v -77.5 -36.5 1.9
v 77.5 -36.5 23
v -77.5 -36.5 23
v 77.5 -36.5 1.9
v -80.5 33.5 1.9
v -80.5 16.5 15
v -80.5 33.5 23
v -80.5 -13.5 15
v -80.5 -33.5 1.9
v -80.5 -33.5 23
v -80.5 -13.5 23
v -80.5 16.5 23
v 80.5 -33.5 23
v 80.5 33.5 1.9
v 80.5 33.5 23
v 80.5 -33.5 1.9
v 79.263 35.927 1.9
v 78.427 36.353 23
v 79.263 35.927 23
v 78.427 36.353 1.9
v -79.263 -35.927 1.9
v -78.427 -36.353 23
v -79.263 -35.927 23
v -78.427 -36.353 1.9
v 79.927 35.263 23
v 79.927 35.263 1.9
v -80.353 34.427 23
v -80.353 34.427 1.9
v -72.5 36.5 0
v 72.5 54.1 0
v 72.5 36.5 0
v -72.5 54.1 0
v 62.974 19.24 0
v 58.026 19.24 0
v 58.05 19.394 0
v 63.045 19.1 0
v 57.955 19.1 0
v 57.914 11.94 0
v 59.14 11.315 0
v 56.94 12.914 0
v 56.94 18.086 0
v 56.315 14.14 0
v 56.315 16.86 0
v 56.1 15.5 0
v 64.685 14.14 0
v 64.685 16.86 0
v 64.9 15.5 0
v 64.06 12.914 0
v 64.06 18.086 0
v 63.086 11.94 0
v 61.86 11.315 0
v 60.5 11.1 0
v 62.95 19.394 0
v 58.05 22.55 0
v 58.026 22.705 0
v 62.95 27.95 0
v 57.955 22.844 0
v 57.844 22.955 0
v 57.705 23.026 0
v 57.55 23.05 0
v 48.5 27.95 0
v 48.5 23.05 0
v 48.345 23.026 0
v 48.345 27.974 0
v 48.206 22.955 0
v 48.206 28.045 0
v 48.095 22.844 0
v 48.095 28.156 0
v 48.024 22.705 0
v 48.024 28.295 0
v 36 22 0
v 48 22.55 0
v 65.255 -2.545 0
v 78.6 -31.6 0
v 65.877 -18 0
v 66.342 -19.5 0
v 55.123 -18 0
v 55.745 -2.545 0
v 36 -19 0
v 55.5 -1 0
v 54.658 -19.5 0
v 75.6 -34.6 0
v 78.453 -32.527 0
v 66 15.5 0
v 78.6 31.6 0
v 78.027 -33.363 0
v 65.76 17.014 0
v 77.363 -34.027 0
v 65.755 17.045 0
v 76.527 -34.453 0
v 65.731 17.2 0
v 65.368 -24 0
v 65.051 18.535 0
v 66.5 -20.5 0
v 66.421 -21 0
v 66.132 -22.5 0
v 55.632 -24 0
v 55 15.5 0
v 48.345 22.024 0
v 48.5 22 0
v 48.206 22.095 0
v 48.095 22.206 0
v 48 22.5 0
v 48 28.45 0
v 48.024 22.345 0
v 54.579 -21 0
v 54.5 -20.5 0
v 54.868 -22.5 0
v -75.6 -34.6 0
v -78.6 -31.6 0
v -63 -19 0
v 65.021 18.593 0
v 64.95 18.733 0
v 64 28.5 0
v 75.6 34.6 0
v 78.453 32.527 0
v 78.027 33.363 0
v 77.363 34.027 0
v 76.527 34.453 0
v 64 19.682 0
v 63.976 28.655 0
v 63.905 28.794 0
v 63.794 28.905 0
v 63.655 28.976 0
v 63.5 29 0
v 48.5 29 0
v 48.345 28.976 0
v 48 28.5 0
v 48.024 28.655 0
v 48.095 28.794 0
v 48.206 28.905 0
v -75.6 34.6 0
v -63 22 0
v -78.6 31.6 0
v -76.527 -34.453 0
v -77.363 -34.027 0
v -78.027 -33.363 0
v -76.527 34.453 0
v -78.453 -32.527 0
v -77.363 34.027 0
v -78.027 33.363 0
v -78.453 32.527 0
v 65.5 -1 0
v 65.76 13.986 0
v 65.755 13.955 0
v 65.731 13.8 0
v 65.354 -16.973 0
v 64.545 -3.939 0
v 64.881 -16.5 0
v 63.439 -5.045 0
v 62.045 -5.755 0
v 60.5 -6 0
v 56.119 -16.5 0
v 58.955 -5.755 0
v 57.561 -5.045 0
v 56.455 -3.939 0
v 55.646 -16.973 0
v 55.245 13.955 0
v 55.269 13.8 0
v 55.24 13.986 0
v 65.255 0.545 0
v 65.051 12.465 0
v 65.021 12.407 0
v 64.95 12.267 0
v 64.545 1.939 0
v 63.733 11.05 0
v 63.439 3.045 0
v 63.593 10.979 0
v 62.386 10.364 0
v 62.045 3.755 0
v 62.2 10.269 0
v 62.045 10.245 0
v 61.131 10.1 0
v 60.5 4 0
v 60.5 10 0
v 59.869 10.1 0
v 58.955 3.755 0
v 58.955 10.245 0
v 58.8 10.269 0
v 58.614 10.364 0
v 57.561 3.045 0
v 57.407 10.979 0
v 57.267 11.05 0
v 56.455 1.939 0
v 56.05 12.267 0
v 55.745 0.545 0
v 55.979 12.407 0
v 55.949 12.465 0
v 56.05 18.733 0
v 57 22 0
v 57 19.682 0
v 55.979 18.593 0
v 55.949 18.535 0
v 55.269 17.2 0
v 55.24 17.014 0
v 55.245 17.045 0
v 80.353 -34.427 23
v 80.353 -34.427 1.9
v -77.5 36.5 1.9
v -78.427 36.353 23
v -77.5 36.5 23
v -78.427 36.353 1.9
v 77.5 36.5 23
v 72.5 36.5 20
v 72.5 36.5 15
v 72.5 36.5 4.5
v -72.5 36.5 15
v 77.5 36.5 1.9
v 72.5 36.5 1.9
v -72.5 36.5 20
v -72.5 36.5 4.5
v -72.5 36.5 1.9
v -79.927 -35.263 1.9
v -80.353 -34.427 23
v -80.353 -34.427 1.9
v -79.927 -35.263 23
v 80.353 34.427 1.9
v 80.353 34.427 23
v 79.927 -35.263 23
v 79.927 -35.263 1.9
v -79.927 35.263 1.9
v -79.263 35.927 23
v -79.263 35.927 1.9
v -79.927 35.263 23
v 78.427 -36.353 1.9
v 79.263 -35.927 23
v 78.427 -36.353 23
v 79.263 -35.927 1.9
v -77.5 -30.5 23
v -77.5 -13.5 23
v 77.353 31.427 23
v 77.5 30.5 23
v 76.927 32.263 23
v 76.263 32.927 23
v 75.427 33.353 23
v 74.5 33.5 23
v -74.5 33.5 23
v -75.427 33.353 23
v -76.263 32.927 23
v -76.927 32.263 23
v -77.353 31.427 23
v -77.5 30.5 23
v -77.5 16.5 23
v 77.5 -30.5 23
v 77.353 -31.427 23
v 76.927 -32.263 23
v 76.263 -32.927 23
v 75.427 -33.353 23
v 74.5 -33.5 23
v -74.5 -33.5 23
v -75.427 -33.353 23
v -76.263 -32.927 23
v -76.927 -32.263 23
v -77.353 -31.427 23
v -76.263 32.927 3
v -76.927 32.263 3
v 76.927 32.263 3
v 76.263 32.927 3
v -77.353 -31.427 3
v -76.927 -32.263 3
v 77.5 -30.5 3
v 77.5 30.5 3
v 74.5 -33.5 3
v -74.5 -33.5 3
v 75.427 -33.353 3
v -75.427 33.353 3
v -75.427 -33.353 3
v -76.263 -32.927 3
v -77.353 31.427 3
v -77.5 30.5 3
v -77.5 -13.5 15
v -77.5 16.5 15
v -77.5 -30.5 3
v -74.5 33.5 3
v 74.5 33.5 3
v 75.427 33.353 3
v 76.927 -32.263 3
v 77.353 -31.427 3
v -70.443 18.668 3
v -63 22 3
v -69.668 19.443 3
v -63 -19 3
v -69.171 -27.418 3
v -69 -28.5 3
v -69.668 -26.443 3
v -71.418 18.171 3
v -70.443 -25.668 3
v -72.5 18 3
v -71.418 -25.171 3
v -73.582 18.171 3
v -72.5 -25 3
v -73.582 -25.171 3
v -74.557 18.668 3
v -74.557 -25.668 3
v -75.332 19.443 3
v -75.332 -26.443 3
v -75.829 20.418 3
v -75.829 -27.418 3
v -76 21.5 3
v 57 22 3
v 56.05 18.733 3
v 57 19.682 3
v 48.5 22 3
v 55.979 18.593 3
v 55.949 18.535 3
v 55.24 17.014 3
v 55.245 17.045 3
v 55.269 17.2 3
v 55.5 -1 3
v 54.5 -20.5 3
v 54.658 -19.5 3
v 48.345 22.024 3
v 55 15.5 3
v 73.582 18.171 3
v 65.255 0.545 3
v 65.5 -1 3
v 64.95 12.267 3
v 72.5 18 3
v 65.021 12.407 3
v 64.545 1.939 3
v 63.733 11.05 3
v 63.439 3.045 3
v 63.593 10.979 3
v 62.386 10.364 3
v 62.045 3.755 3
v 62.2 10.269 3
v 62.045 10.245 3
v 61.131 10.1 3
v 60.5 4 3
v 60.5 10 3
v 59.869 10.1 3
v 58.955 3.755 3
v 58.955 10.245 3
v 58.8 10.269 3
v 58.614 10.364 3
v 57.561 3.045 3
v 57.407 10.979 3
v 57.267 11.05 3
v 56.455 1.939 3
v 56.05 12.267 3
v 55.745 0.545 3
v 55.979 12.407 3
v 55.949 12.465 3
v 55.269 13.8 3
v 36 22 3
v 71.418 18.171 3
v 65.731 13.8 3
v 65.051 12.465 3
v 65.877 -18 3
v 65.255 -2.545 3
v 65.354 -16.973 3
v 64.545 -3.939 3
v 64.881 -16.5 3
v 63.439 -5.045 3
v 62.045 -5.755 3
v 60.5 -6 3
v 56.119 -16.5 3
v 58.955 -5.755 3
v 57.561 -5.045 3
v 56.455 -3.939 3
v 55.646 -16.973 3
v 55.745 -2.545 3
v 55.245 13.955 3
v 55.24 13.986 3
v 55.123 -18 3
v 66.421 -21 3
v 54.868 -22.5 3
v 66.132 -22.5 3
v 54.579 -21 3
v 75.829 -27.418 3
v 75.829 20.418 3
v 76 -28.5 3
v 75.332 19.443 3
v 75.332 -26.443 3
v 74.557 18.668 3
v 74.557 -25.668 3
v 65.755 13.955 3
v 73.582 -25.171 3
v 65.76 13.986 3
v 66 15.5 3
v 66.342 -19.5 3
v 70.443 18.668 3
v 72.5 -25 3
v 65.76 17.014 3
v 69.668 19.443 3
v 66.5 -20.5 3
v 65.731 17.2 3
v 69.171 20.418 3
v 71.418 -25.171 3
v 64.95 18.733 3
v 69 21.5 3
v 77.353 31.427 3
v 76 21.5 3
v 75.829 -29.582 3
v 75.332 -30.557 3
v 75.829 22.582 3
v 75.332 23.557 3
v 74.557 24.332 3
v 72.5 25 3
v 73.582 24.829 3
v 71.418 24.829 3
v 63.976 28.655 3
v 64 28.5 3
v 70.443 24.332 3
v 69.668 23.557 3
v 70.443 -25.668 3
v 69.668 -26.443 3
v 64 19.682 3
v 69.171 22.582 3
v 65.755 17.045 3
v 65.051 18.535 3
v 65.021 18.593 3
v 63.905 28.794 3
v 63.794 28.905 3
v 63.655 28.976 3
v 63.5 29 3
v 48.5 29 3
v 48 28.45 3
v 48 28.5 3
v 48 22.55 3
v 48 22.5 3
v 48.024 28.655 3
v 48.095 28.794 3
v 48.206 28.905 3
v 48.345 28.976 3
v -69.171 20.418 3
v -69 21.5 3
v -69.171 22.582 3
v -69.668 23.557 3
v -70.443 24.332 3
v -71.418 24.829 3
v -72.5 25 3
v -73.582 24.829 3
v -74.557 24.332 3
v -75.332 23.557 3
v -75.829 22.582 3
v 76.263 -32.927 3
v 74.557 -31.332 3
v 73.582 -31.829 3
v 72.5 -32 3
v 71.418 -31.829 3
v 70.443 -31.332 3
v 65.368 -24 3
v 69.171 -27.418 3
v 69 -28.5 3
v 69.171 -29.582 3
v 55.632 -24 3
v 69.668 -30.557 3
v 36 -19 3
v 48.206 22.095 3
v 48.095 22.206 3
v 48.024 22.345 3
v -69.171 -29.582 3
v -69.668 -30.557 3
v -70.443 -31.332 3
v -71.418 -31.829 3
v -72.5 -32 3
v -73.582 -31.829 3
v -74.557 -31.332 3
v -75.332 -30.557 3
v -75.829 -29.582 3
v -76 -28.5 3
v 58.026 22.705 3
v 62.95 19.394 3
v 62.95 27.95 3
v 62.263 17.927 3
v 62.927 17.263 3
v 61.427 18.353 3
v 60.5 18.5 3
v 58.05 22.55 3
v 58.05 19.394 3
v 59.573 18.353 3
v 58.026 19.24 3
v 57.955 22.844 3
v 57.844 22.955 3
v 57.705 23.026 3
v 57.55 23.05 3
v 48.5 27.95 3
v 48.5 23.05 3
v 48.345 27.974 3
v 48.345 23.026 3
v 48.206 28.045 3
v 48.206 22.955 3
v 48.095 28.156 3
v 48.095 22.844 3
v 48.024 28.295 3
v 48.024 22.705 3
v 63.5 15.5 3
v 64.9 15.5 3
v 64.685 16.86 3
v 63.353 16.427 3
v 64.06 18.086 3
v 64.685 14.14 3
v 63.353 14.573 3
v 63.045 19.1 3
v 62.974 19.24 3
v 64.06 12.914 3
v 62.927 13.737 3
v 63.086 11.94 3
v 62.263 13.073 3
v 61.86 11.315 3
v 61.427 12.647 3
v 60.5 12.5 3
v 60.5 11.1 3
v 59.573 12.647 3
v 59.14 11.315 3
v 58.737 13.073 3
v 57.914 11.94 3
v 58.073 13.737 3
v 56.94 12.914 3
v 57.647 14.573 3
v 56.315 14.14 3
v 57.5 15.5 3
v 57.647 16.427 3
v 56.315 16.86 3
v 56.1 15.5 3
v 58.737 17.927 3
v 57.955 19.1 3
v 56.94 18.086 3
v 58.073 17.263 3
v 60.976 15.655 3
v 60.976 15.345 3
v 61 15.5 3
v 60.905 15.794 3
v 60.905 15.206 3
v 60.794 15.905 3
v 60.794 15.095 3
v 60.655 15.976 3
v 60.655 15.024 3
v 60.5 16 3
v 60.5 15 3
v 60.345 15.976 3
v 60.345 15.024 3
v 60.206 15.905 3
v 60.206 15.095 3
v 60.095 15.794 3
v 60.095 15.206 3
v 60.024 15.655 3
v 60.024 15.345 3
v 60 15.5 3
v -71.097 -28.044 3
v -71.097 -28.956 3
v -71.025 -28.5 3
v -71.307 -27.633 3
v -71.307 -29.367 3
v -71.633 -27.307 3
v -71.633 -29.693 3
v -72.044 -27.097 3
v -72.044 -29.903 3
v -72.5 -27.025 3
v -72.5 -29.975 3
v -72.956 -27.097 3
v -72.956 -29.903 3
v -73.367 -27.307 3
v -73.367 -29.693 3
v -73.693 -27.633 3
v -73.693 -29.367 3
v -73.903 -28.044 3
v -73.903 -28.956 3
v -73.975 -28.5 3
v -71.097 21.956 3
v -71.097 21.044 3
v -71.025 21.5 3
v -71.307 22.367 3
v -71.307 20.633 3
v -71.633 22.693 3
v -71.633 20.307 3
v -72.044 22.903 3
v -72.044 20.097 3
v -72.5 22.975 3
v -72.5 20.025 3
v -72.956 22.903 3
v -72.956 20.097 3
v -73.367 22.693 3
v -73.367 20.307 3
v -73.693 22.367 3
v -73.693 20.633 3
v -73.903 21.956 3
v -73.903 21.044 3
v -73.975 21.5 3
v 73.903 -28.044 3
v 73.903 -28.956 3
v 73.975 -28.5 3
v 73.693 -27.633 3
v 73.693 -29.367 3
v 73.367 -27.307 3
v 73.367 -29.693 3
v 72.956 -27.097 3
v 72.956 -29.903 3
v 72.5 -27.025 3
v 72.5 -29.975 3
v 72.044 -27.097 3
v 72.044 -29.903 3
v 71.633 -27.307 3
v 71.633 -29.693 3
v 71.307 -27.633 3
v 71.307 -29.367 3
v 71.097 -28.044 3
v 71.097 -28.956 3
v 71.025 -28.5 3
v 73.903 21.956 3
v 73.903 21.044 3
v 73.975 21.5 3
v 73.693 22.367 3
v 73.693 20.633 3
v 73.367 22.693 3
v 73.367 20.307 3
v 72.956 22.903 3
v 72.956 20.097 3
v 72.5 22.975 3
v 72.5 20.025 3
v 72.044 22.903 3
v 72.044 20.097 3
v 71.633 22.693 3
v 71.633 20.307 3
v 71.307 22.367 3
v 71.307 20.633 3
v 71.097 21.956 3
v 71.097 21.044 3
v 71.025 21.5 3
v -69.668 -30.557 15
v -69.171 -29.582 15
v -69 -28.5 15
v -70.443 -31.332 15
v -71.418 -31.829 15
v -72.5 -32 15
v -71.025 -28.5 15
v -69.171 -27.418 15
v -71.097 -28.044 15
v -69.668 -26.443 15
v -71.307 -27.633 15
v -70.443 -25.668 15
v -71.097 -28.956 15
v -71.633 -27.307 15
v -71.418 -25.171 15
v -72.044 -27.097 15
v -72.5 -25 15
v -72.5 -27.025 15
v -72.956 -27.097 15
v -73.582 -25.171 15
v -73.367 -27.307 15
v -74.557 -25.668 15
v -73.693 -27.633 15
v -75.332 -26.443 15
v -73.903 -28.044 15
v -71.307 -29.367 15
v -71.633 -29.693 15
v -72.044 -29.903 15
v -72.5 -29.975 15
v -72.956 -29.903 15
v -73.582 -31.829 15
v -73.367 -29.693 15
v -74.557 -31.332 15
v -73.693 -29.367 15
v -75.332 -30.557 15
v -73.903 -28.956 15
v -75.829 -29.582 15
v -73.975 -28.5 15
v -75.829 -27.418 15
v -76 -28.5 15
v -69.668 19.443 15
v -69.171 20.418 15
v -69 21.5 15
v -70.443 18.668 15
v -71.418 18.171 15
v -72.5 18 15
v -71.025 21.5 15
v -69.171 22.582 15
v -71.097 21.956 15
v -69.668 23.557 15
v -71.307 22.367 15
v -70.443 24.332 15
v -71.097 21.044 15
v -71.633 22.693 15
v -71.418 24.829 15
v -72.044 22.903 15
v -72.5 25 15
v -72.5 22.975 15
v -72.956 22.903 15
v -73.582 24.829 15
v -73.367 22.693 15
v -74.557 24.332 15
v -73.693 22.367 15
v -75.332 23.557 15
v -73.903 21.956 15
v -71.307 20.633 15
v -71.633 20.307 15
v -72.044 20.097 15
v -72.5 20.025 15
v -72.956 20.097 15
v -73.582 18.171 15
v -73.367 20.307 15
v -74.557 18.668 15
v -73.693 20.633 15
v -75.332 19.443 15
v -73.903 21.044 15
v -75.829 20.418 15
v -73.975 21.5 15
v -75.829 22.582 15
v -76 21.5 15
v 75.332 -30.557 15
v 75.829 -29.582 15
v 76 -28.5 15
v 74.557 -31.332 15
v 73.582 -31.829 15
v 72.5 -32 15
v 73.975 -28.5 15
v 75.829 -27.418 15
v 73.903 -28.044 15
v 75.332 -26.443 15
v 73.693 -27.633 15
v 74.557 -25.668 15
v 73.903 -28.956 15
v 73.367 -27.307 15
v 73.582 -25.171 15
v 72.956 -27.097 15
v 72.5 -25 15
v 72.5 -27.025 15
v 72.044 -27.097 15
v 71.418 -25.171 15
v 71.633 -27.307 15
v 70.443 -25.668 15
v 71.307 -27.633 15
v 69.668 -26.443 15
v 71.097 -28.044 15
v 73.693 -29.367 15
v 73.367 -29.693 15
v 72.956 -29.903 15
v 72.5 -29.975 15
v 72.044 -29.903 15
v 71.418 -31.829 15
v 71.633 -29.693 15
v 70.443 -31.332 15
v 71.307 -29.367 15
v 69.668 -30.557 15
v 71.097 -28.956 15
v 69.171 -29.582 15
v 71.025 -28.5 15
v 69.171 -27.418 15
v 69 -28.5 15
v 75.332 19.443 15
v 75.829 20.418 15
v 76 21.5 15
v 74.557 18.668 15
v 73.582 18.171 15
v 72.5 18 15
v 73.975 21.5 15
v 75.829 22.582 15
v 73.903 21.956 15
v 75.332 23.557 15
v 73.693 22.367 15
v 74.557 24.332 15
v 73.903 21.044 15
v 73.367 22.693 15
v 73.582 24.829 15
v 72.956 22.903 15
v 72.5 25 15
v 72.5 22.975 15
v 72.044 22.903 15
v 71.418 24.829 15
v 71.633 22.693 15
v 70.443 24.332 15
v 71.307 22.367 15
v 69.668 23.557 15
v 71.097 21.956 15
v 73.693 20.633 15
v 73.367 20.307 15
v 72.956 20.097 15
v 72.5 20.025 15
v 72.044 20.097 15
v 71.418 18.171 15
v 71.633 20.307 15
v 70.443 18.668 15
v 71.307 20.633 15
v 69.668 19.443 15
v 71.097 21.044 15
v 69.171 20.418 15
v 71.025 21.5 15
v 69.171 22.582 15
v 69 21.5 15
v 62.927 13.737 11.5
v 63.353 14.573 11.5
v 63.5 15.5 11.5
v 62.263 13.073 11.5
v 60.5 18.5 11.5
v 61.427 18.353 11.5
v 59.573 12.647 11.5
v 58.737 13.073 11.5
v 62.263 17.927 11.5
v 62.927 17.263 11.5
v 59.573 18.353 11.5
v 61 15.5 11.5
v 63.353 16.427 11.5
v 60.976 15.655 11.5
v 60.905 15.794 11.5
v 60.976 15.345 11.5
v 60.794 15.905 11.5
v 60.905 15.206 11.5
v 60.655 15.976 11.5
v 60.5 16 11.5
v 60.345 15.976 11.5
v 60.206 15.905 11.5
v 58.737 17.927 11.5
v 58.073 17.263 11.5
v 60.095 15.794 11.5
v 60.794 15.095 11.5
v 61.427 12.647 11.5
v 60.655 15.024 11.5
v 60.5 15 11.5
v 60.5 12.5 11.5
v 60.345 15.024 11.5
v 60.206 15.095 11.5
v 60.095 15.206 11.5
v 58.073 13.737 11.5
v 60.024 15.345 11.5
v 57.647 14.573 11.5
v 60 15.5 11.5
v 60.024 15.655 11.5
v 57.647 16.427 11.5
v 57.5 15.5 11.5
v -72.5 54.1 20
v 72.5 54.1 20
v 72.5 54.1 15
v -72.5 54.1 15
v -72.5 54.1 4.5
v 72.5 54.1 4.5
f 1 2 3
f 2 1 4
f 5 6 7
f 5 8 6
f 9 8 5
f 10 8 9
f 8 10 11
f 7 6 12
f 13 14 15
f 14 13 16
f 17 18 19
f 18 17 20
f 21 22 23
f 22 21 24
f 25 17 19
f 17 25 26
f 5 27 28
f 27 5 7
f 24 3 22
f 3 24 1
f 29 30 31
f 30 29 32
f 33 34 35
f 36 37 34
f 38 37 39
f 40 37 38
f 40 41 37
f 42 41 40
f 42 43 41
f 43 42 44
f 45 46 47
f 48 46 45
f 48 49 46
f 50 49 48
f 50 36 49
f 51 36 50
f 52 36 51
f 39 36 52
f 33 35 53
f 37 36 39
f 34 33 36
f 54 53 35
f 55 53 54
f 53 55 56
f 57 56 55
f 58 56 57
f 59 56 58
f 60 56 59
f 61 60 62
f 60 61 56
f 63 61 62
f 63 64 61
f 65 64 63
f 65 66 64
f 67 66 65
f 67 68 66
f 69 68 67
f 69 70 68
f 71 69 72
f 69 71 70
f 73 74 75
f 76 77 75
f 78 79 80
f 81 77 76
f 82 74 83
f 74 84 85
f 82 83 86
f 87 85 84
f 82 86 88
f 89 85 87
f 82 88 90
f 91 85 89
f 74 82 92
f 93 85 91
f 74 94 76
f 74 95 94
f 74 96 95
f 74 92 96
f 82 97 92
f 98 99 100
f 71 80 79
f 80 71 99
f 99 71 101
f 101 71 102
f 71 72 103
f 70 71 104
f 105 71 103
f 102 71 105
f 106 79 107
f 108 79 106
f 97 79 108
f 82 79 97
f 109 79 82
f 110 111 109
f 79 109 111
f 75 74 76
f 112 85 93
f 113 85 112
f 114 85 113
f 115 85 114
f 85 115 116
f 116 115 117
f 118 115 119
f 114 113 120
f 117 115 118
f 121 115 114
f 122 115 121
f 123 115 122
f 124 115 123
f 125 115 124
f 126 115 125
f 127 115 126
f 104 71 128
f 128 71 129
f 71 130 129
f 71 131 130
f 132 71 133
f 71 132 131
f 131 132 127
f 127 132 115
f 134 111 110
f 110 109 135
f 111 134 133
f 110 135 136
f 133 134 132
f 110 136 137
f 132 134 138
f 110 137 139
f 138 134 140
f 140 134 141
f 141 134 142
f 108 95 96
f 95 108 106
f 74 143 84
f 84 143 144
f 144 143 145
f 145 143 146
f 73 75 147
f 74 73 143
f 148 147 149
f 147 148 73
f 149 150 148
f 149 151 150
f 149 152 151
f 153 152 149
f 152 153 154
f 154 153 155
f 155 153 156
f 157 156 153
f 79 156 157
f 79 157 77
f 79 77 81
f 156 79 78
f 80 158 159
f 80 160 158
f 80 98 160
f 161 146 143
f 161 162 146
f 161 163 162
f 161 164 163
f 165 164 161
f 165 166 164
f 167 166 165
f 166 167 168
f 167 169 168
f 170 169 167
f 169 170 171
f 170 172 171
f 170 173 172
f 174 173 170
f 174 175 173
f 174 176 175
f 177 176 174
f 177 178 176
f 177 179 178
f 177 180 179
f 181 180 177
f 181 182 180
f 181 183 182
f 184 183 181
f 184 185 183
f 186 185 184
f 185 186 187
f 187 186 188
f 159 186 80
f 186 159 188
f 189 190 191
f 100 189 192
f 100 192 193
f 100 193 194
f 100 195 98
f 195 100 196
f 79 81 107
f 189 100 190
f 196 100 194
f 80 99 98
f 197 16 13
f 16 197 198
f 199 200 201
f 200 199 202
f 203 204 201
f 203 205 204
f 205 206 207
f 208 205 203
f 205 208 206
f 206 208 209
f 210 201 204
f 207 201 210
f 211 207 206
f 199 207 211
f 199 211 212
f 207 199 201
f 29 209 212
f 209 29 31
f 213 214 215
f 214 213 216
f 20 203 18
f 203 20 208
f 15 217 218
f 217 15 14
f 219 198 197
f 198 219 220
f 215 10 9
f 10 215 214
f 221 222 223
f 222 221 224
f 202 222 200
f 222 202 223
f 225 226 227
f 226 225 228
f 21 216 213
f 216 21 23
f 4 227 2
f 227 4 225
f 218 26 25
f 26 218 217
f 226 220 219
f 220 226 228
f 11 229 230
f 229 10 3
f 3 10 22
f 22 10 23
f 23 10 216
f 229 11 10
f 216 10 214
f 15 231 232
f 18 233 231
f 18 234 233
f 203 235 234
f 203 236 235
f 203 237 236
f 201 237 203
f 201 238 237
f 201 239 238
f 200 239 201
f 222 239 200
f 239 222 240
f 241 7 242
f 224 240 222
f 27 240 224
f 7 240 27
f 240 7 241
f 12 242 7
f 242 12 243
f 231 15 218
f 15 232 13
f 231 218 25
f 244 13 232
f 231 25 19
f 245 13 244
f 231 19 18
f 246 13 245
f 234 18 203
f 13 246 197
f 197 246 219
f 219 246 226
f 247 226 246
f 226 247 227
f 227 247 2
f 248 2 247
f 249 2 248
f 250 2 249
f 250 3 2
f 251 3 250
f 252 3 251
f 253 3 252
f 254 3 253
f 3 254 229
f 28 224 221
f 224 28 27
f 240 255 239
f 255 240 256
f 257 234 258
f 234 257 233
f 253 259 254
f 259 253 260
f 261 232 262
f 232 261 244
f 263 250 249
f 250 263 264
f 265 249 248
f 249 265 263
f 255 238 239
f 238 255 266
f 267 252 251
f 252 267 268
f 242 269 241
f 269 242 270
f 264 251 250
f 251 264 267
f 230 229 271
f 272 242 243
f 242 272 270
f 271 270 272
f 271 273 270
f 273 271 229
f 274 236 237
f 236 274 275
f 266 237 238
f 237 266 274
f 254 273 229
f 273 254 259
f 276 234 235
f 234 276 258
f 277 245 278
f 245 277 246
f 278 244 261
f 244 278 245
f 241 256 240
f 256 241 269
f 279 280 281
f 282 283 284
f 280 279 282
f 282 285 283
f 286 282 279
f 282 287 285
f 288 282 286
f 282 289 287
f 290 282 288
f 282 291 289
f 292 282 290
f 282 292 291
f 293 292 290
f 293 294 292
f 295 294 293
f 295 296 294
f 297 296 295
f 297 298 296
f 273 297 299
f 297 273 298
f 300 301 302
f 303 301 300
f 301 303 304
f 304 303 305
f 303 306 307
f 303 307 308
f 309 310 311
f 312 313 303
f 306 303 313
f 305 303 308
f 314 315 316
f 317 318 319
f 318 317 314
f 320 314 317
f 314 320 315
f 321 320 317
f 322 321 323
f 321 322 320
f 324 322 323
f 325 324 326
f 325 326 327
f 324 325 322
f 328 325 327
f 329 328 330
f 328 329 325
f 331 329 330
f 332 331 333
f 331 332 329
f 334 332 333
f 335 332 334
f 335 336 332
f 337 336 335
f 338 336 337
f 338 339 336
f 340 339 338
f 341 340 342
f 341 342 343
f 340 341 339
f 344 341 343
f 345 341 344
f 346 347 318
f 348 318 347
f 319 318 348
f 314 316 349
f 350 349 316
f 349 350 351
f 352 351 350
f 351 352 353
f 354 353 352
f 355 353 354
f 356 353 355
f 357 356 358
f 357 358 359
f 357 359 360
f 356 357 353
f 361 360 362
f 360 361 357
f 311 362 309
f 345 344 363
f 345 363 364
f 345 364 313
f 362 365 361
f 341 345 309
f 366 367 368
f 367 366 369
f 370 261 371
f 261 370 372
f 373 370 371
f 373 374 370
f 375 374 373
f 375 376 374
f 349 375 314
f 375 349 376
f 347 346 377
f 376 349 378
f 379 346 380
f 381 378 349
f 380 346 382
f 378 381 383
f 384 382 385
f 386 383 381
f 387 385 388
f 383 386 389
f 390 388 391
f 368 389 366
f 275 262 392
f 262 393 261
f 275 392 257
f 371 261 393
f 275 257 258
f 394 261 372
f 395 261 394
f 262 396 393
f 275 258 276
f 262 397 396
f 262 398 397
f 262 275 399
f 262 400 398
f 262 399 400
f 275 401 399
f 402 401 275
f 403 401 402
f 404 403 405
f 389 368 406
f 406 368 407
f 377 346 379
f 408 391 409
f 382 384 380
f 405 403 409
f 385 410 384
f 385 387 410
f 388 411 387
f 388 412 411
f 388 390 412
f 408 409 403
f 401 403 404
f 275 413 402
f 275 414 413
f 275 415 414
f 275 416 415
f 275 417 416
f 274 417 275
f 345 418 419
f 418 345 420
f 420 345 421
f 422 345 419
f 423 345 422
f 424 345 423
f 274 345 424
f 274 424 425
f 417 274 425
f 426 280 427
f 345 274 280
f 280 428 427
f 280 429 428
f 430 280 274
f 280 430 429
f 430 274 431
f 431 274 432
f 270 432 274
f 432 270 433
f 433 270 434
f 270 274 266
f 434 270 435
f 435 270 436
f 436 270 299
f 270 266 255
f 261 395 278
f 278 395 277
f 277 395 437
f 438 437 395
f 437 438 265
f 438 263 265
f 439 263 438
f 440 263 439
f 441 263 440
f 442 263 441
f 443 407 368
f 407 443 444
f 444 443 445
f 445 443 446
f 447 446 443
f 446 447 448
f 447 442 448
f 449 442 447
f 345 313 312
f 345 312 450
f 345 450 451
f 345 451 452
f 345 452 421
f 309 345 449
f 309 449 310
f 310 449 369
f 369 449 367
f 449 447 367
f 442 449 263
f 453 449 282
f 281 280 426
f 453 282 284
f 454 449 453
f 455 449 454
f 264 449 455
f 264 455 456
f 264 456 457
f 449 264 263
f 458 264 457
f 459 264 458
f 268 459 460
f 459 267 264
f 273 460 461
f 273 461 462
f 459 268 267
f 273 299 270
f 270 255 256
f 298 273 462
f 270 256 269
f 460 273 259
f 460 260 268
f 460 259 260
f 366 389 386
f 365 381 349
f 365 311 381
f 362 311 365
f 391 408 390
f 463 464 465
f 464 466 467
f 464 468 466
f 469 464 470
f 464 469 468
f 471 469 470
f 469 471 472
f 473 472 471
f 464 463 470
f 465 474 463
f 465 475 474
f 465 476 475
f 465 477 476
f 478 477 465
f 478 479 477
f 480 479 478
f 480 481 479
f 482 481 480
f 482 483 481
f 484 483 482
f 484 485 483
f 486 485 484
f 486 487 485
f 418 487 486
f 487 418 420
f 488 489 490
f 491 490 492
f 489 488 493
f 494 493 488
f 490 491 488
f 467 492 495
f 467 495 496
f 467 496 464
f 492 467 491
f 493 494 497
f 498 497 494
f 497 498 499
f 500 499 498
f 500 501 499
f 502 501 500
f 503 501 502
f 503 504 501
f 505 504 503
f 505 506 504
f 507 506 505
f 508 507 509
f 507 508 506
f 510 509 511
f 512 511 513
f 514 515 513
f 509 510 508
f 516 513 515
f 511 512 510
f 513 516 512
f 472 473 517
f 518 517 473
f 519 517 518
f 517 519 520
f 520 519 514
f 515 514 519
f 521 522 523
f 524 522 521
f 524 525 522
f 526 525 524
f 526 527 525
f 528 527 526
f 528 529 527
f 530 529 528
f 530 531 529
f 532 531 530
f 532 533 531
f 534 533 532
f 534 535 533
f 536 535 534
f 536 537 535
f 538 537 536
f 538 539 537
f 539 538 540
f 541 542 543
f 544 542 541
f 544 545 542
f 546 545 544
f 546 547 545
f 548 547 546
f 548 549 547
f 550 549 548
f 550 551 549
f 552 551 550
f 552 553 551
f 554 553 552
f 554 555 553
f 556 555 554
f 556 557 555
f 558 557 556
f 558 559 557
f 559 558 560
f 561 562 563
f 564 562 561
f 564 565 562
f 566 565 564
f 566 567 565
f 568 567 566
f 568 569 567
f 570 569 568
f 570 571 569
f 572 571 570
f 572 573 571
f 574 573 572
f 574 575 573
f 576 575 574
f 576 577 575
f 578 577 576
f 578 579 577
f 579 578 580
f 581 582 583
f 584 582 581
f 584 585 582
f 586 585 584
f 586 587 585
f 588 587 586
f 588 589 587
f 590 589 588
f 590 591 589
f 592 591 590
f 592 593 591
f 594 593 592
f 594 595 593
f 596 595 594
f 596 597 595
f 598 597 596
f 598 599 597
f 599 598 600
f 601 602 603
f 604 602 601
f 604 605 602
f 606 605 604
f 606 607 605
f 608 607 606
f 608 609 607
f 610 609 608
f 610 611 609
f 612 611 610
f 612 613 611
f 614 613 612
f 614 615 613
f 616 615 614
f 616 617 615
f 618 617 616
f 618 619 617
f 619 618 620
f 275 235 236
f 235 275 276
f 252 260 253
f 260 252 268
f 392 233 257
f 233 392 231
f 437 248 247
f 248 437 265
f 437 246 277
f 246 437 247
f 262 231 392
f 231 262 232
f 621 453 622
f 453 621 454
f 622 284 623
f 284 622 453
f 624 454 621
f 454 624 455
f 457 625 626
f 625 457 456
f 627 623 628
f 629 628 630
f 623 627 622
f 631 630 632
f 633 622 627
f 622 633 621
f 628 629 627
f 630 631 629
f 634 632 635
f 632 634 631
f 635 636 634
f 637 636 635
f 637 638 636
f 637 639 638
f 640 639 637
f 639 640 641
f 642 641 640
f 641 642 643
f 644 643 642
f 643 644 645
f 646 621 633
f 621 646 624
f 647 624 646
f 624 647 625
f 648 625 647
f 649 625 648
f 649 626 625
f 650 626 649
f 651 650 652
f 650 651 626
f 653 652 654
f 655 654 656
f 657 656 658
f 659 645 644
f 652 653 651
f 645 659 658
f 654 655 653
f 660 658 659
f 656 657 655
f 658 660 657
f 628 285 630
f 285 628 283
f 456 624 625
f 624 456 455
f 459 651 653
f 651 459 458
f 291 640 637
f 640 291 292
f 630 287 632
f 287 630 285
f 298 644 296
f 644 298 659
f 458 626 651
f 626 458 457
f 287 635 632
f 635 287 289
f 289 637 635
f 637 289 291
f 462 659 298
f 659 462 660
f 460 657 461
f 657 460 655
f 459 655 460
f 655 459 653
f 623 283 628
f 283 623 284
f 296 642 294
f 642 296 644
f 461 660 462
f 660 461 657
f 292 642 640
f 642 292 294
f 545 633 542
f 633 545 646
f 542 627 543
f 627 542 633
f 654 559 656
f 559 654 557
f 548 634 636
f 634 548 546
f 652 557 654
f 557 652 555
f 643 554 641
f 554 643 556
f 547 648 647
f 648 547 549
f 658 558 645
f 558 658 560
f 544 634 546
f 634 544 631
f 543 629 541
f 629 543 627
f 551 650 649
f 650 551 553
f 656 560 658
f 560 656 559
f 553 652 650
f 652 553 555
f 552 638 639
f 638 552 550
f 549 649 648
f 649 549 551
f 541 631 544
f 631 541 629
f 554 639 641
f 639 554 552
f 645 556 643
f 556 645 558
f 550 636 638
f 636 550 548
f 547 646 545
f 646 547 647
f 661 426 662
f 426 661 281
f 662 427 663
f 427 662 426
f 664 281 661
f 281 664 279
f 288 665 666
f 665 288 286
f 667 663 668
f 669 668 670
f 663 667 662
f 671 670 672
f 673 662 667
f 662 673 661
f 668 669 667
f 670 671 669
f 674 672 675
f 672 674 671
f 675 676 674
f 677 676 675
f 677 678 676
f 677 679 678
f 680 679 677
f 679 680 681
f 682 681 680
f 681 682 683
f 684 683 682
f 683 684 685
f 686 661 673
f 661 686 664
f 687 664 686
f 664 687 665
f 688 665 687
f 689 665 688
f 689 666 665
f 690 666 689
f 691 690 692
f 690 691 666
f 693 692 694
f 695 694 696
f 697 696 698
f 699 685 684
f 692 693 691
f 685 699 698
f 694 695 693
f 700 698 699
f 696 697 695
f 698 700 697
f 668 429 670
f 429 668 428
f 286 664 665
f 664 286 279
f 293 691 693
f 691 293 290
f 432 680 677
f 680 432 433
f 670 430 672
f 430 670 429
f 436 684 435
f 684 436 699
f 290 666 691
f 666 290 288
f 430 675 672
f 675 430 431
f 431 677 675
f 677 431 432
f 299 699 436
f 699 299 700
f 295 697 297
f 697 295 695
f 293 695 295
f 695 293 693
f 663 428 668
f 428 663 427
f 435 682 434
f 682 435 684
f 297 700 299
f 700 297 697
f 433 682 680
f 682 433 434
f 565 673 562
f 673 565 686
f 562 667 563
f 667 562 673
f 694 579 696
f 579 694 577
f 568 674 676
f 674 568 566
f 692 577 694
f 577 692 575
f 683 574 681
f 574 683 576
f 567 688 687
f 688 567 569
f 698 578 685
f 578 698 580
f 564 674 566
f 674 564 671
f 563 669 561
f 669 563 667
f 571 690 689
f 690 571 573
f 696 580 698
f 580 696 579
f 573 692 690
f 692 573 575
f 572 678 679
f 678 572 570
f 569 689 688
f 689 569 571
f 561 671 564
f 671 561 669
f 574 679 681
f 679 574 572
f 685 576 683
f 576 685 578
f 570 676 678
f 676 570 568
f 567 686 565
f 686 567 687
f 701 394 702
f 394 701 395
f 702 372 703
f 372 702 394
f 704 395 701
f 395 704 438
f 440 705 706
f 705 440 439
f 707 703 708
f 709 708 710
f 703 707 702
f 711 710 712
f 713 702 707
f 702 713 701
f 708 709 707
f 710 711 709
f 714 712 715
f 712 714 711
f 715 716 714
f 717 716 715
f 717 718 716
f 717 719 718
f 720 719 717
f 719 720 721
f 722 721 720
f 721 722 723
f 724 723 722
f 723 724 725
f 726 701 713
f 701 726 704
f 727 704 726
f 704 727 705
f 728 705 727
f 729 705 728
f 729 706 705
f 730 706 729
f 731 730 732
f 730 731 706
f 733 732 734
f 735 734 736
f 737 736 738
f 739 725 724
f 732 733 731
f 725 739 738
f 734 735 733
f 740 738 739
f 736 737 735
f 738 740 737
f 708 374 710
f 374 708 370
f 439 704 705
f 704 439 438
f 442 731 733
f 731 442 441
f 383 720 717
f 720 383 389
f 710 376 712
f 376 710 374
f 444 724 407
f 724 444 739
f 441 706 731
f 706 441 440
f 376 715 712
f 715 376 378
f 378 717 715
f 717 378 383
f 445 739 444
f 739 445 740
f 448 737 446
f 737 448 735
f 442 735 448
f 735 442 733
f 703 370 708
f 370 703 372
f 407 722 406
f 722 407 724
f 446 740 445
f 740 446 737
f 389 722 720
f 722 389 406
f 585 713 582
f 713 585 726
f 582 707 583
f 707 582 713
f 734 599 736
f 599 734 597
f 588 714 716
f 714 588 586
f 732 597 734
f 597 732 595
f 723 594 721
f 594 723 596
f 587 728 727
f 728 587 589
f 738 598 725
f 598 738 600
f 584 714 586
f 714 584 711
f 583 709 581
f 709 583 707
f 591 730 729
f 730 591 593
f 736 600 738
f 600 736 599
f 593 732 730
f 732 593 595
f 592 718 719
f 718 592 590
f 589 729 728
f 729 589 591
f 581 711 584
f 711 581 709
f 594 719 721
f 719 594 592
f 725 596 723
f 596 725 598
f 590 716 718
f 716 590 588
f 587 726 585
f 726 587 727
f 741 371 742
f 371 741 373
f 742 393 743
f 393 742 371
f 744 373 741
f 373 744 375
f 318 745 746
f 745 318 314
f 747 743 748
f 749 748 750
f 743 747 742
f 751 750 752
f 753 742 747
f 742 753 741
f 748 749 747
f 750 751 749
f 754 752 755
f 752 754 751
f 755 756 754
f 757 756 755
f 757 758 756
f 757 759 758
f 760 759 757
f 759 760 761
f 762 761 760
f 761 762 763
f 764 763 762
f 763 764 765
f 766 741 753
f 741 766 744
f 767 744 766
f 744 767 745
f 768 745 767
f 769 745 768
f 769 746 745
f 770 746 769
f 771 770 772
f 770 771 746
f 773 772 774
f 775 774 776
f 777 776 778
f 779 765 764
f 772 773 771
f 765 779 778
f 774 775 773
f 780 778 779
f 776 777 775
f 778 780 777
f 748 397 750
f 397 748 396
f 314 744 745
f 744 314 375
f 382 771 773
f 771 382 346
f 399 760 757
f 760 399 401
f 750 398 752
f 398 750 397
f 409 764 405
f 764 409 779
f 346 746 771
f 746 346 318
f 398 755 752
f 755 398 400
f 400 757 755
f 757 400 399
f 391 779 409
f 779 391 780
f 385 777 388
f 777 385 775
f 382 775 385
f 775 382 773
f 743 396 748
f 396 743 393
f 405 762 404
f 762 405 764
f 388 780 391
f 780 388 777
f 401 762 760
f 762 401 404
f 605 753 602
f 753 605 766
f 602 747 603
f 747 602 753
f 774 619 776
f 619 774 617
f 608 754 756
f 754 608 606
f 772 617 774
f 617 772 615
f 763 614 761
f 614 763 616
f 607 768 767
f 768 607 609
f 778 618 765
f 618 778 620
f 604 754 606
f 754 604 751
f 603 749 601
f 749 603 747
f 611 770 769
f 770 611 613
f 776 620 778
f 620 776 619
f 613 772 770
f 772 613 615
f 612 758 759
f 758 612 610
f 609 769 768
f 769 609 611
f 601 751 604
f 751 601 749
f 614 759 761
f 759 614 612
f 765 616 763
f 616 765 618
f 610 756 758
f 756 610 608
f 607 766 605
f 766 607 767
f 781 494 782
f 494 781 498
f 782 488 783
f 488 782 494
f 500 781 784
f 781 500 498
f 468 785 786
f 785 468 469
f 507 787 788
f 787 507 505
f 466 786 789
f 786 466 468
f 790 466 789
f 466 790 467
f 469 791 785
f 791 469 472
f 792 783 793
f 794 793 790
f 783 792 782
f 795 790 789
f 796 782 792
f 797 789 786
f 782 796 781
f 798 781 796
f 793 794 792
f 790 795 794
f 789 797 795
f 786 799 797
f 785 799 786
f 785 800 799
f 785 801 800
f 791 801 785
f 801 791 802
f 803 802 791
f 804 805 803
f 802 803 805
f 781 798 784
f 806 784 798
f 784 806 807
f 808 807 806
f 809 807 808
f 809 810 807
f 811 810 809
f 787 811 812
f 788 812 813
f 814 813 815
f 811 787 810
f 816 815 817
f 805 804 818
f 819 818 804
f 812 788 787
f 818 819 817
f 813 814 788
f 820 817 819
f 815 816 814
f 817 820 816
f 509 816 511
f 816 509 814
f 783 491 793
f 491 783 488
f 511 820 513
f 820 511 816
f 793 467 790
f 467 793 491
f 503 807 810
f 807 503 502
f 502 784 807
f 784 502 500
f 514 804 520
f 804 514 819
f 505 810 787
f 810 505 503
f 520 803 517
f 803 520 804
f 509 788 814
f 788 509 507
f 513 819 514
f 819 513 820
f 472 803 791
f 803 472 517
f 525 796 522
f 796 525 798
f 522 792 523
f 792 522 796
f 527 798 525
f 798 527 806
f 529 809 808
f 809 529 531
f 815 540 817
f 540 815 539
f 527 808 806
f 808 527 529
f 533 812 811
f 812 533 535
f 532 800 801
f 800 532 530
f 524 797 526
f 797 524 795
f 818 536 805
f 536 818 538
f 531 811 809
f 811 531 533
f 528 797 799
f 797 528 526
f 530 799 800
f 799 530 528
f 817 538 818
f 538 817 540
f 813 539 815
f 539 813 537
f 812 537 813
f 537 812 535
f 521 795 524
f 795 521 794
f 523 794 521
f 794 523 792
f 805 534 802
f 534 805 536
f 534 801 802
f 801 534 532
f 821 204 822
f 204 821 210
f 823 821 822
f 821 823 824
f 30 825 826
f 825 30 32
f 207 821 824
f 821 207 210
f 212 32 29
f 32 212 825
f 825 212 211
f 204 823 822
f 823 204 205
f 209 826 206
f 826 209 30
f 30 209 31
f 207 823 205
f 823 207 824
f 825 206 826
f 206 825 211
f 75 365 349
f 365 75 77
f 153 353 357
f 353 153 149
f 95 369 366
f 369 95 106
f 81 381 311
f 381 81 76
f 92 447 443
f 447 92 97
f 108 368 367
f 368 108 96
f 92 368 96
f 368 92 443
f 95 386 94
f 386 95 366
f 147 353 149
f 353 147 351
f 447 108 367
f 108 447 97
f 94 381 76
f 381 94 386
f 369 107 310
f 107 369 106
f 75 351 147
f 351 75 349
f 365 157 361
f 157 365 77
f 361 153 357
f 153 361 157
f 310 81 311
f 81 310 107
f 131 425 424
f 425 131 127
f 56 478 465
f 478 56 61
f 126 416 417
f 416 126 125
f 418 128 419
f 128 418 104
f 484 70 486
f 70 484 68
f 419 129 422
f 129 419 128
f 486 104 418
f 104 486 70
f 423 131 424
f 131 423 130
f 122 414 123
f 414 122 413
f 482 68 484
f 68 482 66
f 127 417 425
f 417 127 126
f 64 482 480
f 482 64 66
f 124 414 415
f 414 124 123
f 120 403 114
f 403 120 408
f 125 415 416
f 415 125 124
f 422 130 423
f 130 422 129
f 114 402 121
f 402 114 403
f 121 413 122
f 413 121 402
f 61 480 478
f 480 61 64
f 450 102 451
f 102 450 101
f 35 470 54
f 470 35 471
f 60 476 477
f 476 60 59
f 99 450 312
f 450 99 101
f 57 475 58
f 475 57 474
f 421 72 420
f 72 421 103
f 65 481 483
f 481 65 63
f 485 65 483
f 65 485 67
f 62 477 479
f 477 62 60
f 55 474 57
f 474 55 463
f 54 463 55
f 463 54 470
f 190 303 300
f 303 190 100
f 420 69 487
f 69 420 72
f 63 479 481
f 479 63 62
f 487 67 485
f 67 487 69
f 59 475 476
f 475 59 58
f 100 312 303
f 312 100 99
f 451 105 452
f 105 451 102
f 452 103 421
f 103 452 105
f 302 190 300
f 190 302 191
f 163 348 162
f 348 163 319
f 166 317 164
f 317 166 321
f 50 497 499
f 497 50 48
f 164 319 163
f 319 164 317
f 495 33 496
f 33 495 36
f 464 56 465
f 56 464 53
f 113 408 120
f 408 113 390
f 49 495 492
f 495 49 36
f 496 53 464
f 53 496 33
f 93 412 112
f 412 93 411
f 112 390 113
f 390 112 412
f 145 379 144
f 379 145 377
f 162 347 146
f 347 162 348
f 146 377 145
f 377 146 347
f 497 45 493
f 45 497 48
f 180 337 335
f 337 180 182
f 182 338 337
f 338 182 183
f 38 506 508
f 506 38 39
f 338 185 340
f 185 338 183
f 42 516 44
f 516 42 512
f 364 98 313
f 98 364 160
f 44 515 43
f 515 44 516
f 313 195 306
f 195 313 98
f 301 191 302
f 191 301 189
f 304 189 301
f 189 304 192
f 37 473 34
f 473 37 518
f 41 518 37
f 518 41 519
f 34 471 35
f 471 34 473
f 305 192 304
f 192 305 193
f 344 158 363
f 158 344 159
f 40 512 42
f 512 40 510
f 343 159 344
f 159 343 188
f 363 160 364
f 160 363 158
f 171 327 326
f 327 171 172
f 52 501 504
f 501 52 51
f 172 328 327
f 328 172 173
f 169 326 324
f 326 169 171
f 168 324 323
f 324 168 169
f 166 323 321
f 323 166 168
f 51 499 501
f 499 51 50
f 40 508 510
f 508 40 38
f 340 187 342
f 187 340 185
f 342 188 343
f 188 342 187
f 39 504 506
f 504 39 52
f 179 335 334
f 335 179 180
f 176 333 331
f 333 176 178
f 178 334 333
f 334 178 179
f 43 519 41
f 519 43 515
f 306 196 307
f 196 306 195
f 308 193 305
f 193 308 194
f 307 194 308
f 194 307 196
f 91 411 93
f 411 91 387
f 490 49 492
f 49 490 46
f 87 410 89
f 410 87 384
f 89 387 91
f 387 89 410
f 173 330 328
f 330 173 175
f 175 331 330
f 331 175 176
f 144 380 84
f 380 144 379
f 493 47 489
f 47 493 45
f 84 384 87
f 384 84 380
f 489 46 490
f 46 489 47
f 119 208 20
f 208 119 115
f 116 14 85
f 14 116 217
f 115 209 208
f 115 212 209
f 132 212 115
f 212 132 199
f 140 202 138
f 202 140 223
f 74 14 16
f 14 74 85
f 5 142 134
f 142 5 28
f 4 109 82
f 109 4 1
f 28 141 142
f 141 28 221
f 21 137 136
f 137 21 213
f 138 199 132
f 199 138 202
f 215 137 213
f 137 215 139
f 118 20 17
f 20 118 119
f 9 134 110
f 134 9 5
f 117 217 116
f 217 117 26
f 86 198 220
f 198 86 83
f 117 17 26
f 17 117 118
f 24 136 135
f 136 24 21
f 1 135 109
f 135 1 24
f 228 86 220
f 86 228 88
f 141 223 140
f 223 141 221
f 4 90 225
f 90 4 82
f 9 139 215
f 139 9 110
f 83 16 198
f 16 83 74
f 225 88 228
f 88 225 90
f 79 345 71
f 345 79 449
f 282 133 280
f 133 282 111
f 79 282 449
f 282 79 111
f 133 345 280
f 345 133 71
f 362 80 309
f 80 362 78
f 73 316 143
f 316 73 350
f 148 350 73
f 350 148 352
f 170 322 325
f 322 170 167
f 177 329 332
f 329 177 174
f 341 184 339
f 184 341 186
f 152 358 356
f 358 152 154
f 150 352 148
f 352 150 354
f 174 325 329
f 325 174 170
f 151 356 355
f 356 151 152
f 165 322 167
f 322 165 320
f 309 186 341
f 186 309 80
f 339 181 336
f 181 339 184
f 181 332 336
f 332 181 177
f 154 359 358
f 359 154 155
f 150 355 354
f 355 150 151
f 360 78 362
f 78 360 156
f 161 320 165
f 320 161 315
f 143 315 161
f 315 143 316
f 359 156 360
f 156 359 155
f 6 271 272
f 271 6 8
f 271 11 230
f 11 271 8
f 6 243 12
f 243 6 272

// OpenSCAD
// yet another LCD panel case.  This one is for the GEEETech, which I think is pretty much the same as the RepRapDiscount one.
// this is intended to be used with a complementary rear mount of some kind.
//
// John Ridley October 24 2013 
// 	Prusa i3 single plate versión modified by Pablo Blanco 2014


prusai3_frame_width = 10.5;

boxix = 155; 
boxiy = 67;
boxiz = 20;

dispx = 99;
dispy = 41;
dispxoff = 14.5;
dispyoff = 14.5;
disptaper = 2; // 2mm taper on each side

controld = 10;
controlxoff = 138;
controlyoff = 32.5;
buzzyoff = 13;

buttond = 10;
buttonxoff = 138;
buttonyoff = 49;
buttonht = 8.5;

mountx = 145;
mounty = 50;
mountxoff = 5; 
mountyoff = 5;
mountpillard = 7;
mountholed = 2.95;
mountht = 12;

// the mounting bracket stuff
screwheadd = 9;
screwholed = 4.2;
woodscrewd = 4.2;
woodscrewh = 7;
woodscrewhh = 2;
hingelength = 50;
mountmainlength = 35;
mounthingelength = 15;
// put the mount near the controls for stability
// that's where people will be poking at the thing.
mountoffset = 40;

sdy = 30;
sdz = boxiz - mountht;
sdyoff = 20;
sdht = 4;

cornerr = 3;
wall = 3;

// knob dimensions
ctlid = 6.3;
ctldd = 5; // dimension across d flat
ctlod = 9;
ctlht = 5;
knobd = 25;
knobh = 15;


$fn = 20;




// this is the panel cover
if (1)
{
	// flip over for printing
	translate([0,0,boxiz+wall])
	rotate([180,0,0])

	difference()
	{
		boxsolids();
		boxvoids();
	}
}

// this is the mounting hinge - make two, use a 6-32 x 3" screw
if (0)
{
	rotate([90,0,0])
	difference()
	{
		union()
		{
			frame_support(mounthingelength);
			cube([mounthingelength, wall, hingelength]);
		}
		for (z=[0,1])
		translate([mounthingelength/2,wall+0.01,screwheadd*2 + z*(hingelength-screwheadd*3)])
		rotate([90,0,0])
		woodscrewhole(woodscrewd, woodscrewh, woodscrewhh, wall+0.1);
	}
}

// this is the knob
if (0)
{
	difference()
	{
		knobsolids();
		knobvoids();
	}
}

ctlid = 6.3;
ctldd = 5; // dimension across d flat
ctlod = 12;
ctlht = 5;
knobd = 25;
knobh = 10;
knobtaper = 2;

module knobsolids()
{
	hull()
	{
		cylinder(r=(knobd-knobtaper*2)/2, h=0.01);
		translate([0,0,knobtaper])
			cylinder(r=knobd/2, h=knobh-knobtaper);
	}
}

module knobvoids()
{
	// hollow out most of the interior
	translate([0,0,6])
	{
	difference()
	{
		cylinder(r=knobd/2-4, h=knobh);
		cylinder(r=ctlod/2, h=knobh);
	}

	// shaft hole
//	translate([0,0,5])
	difference()
	{
		cylinder(r=ctlid/2, h=knobh);
		// this is one way to make the key
		translate([0, (ctlid-ctldd+1.5),0])
			cylinder(r=1.5, h=knobh);
		// this is another = 
//		translate([-ctlid/2,ctlid-ctldd,0])
//			cube([ctlid, ctlid, knobh]);
	}
	// cutouts for flat springy bit
	// only use if needed - it weakens the part
//	for (x1=[-1,1])
//	translate([-0.5 + x1*2.5,ctlid-ctldd,0])
//		cube([1,5,knobh]);
	}

	// some knurling
	for (a=[0:9])
	rotate([0,0,a*360/10])
	translate([3+knobd/2,0,0])
	cylinder(r=4,h=knobh);
}

module woodscrewhole(screwd, headd, headh, wallthick)
{
	cylinder(r=screwd/2, h=wallthick);
	cylinder(r1=headd/2, r2=screwd/2, h=headh);
}


module boxvoids()
{

	if (0) // actually don't bevel since we're inset
	{
		// let's bevel the display edges
	// display cutout
	translate([-boxix/2 + dispxoff, -dispy+boxiy/2-dispyoff, boxiz])
		union()
		{
			hull()
			{
				translate([-disptaper, -disptaper, wall])
					cube([dispx+disptaper*2, dispy+disptaper*2, 0.1]);
				translate([0,0,wall*1/3])
					cube([dispx, dispy, 0.1]);
			}
			cube([dispx, dispy, wall]);
		}
	}
	if (1) // untapered display cutout
	{
	// display cutout
	translate([-boxix/2 + dispxoff, -dispy+boxiy/2-dispyoff, boxiz])
		cube([dispx, dispy, wall]);
	}

	// control cutout
	translate([-boxix/2+controlxoff,boxiy/2-controlyoff,0])
		cylinder(r=controld/2, h=boxiz+wall);

	// speaker cutout
	translate([-boxix/2 + controlxoff,boxiy/2 - buzzyoff,0])
	intersection()
	{
		cylinder(r=6, h=boxiz+wall);
		translate([-6,0,0])
			for (iy=[-1:1])
				translate([0,iy*3-1,0])
					cube([12,1.5,boxiz+wall]);
	}

	// sd card hole
	translate([-boxix/2-wall,boxiy/2-sdy - sdyoff,0])
		cube([wall*10, sdy, sdz]);

	// reset button
	translate([-boxix/2 + buttonxoff, boxiy/2-buttonyoff, boxiz-wall])
		button_cutout();

	// taper the bottom
	translate([0,0,boxiz+wall-disptaper])
	difference()
	{
		roundedbox(boxix+wall*2, boxiy+wall*2, disptaper, cornerr);
		hull()
		{
			roundedbox(boxix+wall*2, boxiy+wall*2, 0.1, cornerr);
translate([0,0,disptaper])
//			translate([-disptaper, -disptaper, disptaper])
				roundedbox(boxix+wall*2-disptaper*2, boxiy+wall*2-disptaper*2, 0.1, cornerr);
		}
	}
}

module boxsolids()
{
	// the main box
	difference()
	{
		roundedbox(boxix+wall*2, boxiy+wall*2, boxiz+wall, cornerr);
		roundedbox(boxix, boxiy, boxiz, cornerr);
	}

	// mount pillars
	for (ix=[0,1])
	for (iy=[0,1])
	translate([-boxix/2+mountxoff + mountx*ix,boxiy/2-mountyoff - mounty*iy,boxiz - mountht])
	difference()
	{
		cylinder(r=mountpillard/2, h=mountht);
		cylinder(r=mountholed/2, h=mountht);
	}

	// button pokey bit
	translate([-boxix/2 + buttonxoff, boxiy/2-buttonyoff, boxiz-buttonht])
		// the tiny hole in the center makes your slicer use a lot more infill for a sturdy button.
		difference()
		{
			cylinder(r=buttond/2*0.6, h=buttonht);
			cylinder(r=0.5, h=buttonht);
		}

	rotate([0,0,180])
	translate([ - mountx/2, 34, 3])
		frame_support(mountx, mounty);
}

module roundedbox(x,y,z,rad)
{
	hull()
	for (ix=[-1,1])
	for (iy=[-1,1])
	{
		translate([(x/2-rad)*ix, (y/2-rad)*iy,0])
			cylinder(r=rad, h=z);
	}
}


module button_cutout()
{
	minkowski()
	{
		difference()
		{
			union()
			{
				cylinder(r=buttond/2, h=wall);
				translate([-(buttond*0.6)/2,-(buttond*1.3),0])
					cube([buttond*0.6,buttond,wall]);
				translate([-buttond*1.5+(buttond*0.6)/2,-(buttond*1.3),0])
					cube([buttond*1.5,buttond*0.6,wall]);
			}
			// same but slightly tinier
			union()
			{
				cylinder(r=buttond/2-0.1, h=wall);
				translate([-(buttond*0.6)/2+0.05,-(buttond*1.3-0.05),0])
					cube([buttond*0.6-0.1,buttond,wall]);
				translate([-buttond*1.5+(buttond*0.6)/2,-(buttond*1.3)+0.05,0])
					cube([buttond*1.5-0.1,buttond*0.6-0.1,wall]);
			}
		}
		cylinder(r=0.5,h=wall);
	}
}



module frame_support(length, height)
{
	difference() {
		hull()
		{
			cube([length,0.1, 20]);
			translate([0,20,0])
				cube([length,0.1, 20]);
		}
		hull()
		{
			translate([0,0,5]) {
				cube([length+5,0.1, prusai3_frame_width]);
				translate([0,25,0])
					cube([length,0.1, prusai3_frame_width]);
			}
		}
	}
	
}
